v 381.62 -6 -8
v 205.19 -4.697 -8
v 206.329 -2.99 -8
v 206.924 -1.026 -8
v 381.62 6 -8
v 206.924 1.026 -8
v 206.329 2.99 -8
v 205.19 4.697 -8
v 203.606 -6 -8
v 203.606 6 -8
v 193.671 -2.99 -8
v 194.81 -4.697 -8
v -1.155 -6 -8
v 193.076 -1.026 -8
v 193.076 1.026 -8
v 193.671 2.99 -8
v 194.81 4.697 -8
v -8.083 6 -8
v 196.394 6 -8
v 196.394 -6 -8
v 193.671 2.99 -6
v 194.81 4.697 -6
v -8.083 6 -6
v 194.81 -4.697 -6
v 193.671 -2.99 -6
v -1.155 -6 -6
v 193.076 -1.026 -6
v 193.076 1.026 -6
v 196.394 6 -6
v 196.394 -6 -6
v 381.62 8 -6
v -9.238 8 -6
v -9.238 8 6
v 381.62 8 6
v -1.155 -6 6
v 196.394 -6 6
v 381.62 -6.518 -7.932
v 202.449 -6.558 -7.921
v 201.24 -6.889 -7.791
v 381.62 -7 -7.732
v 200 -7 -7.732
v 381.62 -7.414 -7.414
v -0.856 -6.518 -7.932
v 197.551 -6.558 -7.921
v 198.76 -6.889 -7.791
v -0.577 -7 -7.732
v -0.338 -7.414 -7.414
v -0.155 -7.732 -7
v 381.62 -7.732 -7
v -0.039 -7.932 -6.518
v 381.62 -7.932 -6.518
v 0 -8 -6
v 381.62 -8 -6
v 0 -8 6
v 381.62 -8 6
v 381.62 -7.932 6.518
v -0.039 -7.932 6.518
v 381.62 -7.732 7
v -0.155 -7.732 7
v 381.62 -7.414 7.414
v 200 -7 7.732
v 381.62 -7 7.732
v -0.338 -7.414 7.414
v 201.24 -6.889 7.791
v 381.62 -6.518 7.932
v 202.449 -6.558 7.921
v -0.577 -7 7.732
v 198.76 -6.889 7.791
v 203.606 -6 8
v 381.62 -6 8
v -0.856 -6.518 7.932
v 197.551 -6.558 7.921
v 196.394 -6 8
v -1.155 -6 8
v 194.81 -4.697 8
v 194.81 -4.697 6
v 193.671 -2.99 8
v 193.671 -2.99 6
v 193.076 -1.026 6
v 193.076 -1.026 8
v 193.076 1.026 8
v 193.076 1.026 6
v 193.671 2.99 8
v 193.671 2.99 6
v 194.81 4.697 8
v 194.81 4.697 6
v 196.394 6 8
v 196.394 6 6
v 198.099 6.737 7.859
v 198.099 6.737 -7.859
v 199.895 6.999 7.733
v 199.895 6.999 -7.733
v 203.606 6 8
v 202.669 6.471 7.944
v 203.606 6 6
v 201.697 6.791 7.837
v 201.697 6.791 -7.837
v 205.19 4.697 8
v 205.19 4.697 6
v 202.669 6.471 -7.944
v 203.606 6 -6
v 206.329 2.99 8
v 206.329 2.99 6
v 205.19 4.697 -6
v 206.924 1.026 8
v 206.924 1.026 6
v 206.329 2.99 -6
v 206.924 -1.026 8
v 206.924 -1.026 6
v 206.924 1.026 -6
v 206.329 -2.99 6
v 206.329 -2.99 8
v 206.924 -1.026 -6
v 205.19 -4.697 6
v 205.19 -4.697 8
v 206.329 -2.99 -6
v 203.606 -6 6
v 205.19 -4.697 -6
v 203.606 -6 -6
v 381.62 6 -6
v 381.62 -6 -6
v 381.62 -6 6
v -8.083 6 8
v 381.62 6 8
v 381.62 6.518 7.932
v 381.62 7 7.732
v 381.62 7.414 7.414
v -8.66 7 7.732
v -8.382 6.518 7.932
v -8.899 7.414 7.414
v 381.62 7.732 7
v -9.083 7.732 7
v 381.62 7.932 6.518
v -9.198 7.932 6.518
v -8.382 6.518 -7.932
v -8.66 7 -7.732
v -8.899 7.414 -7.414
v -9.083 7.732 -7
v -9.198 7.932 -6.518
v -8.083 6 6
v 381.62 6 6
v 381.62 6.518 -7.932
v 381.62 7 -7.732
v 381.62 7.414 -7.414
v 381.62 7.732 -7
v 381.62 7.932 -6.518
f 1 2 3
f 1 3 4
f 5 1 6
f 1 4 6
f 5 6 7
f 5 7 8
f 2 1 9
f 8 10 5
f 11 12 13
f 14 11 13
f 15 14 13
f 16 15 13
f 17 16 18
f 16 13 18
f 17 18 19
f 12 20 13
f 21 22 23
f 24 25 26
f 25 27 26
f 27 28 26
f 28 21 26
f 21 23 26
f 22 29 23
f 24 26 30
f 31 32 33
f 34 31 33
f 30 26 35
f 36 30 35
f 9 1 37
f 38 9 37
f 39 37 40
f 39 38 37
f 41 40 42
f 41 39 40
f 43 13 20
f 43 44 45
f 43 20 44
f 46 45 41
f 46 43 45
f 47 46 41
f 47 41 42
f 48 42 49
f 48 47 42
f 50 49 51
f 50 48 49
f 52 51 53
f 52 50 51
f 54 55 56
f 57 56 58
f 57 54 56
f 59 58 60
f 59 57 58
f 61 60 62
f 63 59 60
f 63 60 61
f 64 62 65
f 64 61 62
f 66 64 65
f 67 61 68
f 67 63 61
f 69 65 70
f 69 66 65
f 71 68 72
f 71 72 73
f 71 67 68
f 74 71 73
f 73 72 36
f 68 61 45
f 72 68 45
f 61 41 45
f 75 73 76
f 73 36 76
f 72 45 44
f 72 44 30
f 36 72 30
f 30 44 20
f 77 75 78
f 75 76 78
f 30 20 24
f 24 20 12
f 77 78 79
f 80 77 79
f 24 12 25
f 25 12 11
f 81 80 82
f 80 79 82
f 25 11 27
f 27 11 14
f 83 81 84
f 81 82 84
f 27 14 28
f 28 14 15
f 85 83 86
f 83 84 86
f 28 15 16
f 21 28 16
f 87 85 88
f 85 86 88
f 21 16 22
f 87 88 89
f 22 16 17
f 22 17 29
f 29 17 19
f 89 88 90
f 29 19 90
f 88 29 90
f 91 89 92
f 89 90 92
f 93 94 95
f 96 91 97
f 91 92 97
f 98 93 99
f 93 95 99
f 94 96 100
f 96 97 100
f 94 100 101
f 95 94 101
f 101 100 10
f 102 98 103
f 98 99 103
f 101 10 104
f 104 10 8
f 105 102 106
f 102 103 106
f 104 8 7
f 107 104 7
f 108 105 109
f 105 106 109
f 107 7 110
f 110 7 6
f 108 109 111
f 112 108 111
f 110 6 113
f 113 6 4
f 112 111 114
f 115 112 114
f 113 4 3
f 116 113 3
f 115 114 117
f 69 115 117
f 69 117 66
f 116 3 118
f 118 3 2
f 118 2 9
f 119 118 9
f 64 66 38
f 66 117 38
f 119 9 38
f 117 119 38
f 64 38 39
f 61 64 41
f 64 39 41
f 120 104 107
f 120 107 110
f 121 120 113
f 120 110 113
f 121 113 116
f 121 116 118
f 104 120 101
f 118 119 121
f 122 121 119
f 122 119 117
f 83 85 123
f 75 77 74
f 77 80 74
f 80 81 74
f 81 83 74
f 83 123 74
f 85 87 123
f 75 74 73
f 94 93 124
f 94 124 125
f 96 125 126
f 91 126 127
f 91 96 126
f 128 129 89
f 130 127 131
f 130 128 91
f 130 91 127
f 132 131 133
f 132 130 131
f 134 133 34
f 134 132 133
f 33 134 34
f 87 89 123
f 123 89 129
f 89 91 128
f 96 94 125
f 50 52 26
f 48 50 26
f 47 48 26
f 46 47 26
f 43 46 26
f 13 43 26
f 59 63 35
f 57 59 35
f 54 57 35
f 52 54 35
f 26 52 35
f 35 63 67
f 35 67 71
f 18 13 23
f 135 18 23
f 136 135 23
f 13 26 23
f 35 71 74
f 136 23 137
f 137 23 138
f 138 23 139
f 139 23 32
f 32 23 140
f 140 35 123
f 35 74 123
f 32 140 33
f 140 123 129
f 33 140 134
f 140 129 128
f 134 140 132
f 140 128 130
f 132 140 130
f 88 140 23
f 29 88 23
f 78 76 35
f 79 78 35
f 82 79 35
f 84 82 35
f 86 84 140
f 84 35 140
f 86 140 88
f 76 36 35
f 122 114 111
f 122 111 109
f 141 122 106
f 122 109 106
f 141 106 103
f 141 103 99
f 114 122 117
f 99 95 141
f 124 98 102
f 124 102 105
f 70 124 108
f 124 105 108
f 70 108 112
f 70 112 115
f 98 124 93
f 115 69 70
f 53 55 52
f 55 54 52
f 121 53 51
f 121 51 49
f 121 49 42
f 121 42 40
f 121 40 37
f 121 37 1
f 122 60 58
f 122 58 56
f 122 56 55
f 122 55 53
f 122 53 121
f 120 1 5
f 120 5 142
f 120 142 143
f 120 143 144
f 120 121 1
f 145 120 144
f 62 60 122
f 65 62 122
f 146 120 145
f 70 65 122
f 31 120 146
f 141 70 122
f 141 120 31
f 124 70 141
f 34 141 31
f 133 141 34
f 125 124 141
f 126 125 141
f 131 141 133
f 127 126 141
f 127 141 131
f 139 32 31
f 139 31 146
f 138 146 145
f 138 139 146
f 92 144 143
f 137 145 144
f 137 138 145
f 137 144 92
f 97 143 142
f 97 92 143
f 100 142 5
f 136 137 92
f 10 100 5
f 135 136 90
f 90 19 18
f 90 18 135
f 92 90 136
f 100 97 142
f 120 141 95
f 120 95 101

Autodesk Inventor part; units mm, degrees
ref_plane "YZ Plane" through (0, 0, 0) normal (1, 0, 0) x (0, 1, 0)
ref_plane "XZ Plane" through (0, 0, 0) normal (0, 1, 0) x (-1, 0, 0)
sketch "Sketch1" plane through (0, 0, 0) normal (1, 0, 0) x (0, 1, 0)
  line L0 (6, 8) -> (-6, 8)
  line L1 (-8, 6) -> (-8, -6)
  line L2 (-6, -8) -> (6, -8)
  line L3 (8, -6) -> (8, 6)
  line L4 (8, 8) -> (-8, -8) construction
  line L5 (-8, 8) -> (8, -8) construction
  line L6 (6, -6) -> (-6, -6)
  line L7 (-6, -6) -> (-6, 6)
  line L8 (-6, 6) -> (6, 6)
  line L9 (6, 6) -> (6, -6)
  arc A0 (8, 6) -> (6, 8) centre (6, 6) ccw
  arc A1 (6, -8) -> (8, -6) centre (6, -6) ccw
  arc A2 (-8, -6) -> (-6, -8) centre (-6, -6) ccw
  arc A3 (-6, 8) -> (-8, 6) centre (-6, 6) ccw
  point P0 (0, 0)
  dimension "d1" = 16
  dimension "d2" = 16
  dimension "d3" = 2
  dimension "d4" = 2
extrude "Extrusion1" add sketch "Sketch1" along normal blind 381.62
sketch "Sketch2" plane through (0, -6, 8) normal (0, 0, 1) x (1, 0, 0)
  line L0 (0, 12) -> (0, 0) projected
  point P0 (0, 6)
  point P1 (200, 6)
  point P2 (0, 6)
  dimension "d7" = 200
hole "Hole1" at (200, 0, 8) direction (0, 0, -1) diameter 14 end through all
sketch "Sketch3" plane through (0, -6, 8) normal (0, 0, 1) x (1, 0, 0)
  line L0 (0, -2) -> (-9.2376, 14)
  line L1 (0, -2) -> (18.4752, -2) construction
  line L2 (-9.2376, 14) -> (0, 14)
  point P0 (0, 6)
  dimension "d15" = 120
ref_plane "Work Plane1" through (0, -8, 8) normal (0.866, 0.5, 0) x (-0.5, 0.866, 0)
extrude "Extrusion2" add sketch "Sketch1" against normal up to surface surface through (0, -8, 8) normal (0.866, 0.5, 0)
properties part number "suspensionarms"
